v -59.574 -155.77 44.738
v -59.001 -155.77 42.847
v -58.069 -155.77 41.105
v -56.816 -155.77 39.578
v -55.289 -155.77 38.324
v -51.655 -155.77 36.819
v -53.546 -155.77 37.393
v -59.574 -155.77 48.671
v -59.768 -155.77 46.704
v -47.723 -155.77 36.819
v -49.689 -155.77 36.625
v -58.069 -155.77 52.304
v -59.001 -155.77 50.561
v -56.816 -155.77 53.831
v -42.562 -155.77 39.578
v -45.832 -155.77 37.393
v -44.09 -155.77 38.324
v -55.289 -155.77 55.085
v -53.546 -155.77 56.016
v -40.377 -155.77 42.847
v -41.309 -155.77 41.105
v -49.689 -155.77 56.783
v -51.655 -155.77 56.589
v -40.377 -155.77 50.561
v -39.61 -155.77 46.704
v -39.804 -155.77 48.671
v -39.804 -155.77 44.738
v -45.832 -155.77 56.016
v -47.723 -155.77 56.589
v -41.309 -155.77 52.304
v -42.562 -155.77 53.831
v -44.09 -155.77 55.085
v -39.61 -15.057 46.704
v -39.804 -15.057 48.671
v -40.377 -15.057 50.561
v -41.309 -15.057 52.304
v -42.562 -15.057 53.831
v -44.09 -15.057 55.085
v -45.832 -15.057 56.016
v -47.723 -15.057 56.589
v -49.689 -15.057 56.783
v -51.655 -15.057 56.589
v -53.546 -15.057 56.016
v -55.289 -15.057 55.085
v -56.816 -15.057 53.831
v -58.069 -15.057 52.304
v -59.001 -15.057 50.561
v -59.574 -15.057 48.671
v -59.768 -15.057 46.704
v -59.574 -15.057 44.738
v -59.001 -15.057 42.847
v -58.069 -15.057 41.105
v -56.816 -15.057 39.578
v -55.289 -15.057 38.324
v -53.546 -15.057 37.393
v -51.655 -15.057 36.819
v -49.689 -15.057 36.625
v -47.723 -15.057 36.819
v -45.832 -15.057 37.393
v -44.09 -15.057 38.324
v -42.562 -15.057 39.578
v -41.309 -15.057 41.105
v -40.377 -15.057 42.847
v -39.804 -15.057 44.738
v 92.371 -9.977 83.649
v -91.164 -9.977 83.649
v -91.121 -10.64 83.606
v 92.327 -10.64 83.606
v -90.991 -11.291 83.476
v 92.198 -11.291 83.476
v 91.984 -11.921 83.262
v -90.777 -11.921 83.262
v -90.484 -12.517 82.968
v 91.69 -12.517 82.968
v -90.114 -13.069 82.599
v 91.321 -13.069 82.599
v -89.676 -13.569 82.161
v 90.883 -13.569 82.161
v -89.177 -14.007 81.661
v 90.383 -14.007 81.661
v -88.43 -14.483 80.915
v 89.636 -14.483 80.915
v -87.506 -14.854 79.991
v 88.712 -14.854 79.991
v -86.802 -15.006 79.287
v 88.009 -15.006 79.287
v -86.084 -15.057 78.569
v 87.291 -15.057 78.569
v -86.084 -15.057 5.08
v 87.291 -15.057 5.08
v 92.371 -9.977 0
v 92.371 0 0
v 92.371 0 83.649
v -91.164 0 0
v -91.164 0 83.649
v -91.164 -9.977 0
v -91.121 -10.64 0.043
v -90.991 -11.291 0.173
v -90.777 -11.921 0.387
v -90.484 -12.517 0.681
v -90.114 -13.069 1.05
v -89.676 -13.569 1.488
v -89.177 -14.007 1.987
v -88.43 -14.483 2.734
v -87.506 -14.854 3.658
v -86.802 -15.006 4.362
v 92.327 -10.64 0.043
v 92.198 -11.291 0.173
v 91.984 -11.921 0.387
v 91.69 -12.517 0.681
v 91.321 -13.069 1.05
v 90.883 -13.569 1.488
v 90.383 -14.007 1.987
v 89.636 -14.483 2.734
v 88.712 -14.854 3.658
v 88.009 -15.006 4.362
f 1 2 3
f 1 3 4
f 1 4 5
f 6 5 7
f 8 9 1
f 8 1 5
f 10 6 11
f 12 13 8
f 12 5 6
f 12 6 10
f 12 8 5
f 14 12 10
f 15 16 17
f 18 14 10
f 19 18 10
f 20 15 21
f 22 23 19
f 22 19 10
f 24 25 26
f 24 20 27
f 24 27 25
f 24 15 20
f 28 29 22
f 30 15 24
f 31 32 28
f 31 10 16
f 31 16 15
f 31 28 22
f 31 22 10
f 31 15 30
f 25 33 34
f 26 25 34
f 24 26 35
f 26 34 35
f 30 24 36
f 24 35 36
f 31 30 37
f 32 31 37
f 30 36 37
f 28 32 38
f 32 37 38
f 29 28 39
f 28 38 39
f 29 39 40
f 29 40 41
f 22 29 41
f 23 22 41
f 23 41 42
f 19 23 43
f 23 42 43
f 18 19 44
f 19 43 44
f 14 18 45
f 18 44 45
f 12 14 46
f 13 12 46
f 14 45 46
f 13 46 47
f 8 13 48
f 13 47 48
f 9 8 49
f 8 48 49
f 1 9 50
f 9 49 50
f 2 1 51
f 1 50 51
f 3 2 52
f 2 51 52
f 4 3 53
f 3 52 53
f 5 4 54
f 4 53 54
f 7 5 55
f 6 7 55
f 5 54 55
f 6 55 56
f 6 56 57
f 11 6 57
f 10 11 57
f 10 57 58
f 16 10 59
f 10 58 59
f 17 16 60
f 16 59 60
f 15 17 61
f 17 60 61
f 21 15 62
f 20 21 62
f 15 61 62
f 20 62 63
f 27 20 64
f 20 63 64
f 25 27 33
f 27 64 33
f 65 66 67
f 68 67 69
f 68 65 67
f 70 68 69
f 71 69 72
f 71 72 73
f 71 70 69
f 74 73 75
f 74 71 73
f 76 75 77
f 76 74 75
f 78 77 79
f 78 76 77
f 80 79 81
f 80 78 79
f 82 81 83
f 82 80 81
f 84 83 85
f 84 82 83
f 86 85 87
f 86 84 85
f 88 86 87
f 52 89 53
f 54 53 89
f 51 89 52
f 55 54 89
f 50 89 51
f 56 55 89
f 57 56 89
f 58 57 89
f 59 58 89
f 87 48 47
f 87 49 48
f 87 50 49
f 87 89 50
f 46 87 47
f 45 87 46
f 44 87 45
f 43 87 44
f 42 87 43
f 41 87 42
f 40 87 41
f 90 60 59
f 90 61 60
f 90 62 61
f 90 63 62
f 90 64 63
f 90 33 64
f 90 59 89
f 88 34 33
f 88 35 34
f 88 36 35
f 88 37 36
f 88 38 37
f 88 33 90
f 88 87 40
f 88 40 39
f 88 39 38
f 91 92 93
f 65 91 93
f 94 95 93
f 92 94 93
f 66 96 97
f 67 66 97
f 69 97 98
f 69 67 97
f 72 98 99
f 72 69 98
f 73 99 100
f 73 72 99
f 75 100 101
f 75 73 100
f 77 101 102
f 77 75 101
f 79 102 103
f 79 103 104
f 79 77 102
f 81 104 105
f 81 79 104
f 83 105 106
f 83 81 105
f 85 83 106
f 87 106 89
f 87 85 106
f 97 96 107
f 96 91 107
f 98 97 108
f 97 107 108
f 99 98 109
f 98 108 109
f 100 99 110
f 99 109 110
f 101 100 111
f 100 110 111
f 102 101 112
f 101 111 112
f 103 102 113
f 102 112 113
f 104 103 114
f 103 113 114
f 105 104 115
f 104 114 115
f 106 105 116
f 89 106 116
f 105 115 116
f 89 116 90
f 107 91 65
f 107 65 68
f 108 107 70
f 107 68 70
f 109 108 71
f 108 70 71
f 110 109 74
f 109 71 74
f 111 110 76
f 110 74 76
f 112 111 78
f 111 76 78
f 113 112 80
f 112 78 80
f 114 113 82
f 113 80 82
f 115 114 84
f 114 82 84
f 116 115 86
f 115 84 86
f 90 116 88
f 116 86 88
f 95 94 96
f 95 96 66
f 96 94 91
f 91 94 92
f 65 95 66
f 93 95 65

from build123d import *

# Parameters (mm, degrees)
F0_W     = 183.534793
F0_H     = 83.64898
F1_DEPTH = 15.056554
F2_R     = 5.08
F3_R     = 10.078833
F4_DEPTH = 140.712947


with BuildPart() as f1:
    # F0 (on Front) → F1 (new body)
    with BuildSketch(Plane.XZ):
        with Locations((0.603248, 41.82449)):
            Rectangle(F0_W, F0_H)
    extrude(amount=F1_DEPTH)

    # F2
    f2_edges = [f1.edges().sort_by_distance(p)[0] for p in [
        (0.603247, -15.056554, 83.64898),
        (-91.164149, -15.056554, 41.82449),
        (92.370644, -15.056554, 41.82449),
        (0.603247, -15.056554, 0),
    ]]
    fillet(f2_edges, radius=F2_R)

    # F3 (on face) → F4 (join)
    with BuildSketch(Plane.XZ.offset(15.056554)):
        with Locations((-49.689099, 46.704315)):
            Circle(F3_R)
    extrude(amount=F4_DEPTH)


solid = f1.part
